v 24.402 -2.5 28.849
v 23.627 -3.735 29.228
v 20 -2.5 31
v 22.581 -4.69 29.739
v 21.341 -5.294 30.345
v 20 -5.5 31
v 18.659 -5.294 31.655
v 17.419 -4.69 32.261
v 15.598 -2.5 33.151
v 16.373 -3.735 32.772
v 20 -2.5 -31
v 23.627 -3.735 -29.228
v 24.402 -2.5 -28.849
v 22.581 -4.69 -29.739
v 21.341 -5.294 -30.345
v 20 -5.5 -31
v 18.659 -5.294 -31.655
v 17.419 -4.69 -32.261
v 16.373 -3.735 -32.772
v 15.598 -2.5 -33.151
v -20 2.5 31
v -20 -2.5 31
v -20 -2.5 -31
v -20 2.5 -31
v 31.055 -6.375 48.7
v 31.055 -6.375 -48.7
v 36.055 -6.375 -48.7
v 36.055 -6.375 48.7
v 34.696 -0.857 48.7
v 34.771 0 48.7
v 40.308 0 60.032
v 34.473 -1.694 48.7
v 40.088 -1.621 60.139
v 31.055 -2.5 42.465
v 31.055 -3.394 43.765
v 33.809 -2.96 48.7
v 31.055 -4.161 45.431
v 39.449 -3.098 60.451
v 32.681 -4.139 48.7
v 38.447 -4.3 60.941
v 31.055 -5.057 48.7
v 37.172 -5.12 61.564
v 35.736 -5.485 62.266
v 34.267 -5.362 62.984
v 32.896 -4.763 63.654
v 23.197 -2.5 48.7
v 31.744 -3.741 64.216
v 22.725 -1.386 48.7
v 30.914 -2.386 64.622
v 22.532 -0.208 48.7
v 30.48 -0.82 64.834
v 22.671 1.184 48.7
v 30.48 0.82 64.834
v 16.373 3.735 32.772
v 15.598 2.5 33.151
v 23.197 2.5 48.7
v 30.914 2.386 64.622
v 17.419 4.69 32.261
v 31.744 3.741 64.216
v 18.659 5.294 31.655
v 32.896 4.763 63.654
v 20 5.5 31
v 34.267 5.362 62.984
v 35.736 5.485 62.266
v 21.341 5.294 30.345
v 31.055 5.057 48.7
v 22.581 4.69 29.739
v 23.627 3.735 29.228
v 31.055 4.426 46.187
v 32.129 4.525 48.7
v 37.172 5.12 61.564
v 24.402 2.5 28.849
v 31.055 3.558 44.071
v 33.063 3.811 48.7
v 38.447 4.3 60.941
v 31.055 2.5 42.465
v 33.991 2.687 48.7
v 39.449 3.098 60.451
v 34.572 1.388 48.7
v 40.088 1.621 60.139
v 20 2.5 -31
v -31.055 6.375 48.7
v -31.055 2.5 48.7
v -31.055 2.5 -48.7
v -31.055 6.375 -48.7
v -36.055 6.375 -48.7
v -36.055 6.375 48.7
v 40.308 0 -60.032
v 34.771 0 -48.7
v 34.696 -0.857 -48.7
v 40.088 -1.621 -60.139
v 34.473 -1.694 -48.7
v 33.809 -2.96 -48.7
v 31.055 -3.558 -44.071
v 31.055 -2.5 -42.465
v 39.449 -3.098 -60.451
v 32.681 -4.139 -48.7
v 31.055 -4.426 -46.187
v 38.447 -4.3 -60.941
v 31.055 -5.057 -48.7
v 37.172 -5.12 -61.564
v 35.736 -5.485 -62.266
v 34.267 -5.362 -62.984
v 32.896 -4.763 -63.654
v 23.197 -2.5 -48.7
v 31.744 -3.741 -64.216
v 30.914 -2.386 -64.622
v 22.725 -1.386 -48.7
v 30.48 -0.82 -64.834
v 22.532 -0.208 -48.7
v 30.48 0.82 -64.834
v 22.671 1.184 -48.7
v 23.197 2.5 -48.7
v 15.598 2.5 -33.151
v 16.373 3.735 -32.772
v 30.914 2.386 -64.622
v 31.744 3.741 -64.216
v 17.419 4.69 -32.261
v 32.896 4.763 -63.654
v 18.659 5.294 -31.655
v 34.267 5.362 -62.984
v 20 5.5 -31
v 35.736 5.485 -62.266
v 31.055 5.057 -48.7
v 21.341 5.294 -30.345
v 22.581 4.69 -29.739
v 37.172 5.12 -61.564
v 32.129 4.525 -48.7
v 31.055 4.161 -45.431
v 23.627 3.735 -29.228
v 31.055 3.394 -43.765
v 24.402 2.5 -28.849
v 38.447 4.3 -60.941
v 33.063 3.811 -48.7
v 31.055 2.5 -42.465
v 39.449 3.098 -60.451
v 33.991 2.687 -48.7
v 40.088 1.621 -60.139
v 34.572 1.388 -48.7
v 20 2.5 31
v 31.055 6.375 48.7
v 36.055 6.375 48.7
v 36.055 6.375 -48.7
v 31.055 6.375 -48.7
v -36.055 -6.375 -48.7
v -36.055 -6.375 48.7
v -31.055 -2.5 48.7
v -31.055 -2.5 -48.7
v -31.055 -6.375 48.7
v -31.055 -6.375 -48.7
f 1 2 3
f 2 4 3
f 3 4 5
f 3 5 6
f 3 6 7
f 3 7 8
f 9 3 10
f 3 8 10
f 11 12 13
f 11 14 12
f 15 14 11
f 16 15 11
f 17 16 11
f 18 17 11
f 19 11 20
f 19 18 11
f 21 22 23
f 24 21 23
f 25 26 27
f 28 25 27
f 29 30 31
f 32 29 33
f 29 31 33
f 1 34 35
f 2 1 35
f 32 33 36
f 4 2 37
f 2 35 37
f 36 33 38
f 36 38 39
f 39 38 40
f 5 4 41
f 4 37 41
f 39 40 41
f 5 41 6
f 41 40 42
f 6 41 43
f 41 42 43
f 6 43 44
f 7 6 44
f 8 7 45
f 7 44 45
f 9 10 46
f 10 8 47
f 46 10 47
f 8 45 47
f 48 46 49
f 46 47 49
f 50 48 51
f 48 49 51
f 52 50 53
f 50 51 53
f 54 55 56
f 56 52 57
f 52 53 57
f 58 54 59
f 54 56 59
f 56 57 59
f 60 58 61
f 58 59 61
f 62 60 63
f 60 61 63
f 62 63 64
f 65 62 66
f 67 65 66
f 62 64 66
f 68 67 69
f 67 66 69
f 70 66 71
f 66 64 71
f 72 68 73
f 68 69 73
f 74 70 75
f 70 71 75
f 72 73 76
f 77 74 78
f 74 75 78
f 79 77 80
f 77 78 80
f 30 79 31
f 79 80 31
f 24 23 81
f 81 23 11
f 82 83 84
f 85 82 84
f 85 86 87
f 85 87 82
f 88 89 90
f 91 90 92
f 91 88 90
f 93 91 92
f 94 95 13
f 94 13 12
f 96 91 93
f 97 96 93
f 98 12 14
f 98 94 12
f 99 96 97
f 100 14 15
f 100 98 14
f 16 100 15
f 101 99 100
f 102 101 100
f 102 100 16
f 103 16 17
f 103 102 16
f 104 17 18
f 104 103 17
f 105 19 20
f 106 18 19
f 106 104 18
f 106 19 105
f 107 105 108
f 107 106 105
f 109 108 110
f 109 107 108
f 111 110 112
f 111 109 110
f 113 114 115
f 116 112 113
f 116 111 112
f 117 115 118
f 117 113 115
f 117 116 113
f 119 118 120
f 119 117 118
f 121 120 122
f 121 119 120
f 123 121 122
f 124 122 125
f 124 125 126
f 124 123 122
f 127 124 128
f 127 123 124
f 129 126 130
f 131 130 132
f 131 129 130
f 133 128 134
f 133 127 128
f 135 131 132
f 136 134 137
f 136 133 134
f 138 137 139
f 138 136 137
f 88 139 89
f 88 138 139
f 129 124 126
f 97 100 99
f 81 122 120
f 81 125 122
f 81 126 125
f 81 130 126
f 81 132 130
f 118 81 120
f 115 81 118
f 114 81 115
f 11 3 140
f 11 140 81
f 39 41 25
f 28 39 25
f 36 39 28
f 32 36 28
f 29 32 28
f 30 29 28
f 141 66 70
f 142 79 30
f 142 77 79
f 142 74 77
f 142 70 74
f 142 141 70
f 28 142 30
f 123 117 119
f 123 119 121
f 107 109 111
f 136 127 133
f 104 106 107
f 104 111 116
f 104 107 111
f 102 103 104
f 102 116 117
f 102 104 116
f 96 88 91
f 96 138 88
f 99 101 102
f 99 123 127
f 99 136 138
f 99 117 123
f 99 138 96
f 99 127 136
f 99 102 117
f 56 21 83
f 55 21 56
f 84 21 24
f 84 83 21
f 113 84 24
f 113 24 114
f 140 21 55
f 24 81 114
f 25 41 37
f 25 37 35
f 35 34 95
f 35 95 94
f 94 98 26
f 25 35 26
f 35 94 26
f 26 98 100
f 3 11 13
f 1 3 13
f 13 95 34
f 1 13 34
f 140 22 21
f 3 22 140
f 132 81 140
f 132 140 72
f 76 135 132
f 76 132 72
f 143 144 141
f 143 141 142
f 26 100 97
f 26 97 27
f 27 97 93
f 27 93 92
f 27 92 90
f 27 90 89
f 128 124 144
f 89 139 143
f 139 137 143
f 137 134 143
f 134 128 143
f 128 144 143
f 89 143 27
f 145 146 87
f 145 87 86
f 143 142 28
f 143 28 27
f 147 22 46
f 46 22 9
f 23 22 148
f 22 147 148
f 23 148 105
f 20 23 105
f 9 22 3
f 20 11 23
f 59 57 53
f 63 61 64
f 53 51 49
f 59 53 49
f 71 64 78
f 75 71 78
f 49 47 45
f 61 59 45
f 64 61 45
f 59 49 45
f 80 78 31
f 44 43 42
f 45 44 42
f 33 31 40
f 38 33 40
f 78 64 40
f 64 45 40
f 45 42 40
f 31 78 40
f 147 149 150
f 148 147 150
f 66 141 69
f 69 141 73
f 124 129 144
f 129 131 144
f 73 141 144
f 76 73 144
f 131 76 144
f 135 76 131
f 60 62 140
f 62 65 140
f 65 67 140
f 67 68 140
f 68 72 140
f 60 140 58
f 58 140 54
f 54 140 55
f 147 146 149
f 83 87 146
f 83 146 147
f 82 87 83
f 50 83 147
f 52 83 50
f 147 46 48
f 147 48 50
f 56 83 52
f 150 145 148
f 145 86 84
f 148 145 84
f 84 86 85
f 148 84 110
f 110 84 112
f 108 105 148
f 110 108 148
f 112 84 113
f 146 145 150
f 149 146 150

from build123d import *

# Parameters (mm, degrees)
SKETCH1_W               = 72.11
SKETCH1_H               = 97.4
BOSS_EXTRUDE1_DEPTH     = 2.5
SKETCH2_W               = 5
SKETCH2_H               = 97.4
BOSS_EXTRUDE2_DEPTH     = 6.375
CUT_EXTRUDE1_DEPTH      = 62.240661737
CUT_EXTRUDE1_DEPTH_BACK = 62.240661737
SKETCH3_W               = 40
SKETCH3_H               = 62


with BuildPart() as part:
    # Sketch1 → Boss-Extrude1 (new, symmetric)
    with BuildSketch(Plane(origin=(0, 0, 0), x_dir=(1, 0, 0), z_dir=(0, 1, 0))):
        Rectangle(SKETCH1_W, SKETCH1_H)
    extrude(amount=BOSS_EXTRUDE1_DEPTH, both=True)

    # Sketch2 → Boss-Extrude2 (add, symmetric)
    with BuildSketch(Plane(origin=(0, 0, 0), x_dir=(1, 0, 0), z_dir=(0, 1, 0))):
        with Locations((-33.555, 0)):
            Rectangle(SKETCH2_W, SKETCH2_H)
        with Locations((33.555, 0)):
            Rectangle(SKETCH2_W, SKETCH2_H)
    extrude(amount=BOSS_EXTRUDE2_DEPTH, both=True)

    # Sketch3 → Cut-Extrude1 (cut, two sides: drawn at the far end of the back side and taken through both)
    with BuildSketch(Plane(origin=(0, 2.5, 0), x_dir=(1, 0, 0), z_dir=(0, 1, 0)).offset(-CUT_EXTRUDE1_DEPTH_BACK)):
        Rectangle(SKETCH3_W, SKETCH3_H)
    extrude(amount=CUT_EXTRUDE1_DEPTH + CUT_EXTRUDE1_DEPTH_BACK, mode=Mode.SUBTRACT)

    # Sketch4 → Revolve1 (revolve)
    with BuildSketch(Plane(origin=(0, 0, 0), x_dir=(1, 0, 0), z_dir=(0, 1, 0)), mode=Mode.PRIVATE) as revolve1_sk:
        Polygon((20, 31), (15.058430503, 33.414723774), (30.424854519, 64.86107512), (35.366424016, 62.446351346), align=None)
    revolve1 = revolve(revolve1_sk.sketch.rotate(Axis((20, 0, -31), (0.4390406861851917, 0, -0.8984671813004836)), 180), axis=Axis((20, 0, -31), (0.4390406861851917, 0, -0.8984671813004836)))

    # Mirror1: Revolve1 across plane
    add(revolve1.mirror(Plane.XY))


solid = part.part
